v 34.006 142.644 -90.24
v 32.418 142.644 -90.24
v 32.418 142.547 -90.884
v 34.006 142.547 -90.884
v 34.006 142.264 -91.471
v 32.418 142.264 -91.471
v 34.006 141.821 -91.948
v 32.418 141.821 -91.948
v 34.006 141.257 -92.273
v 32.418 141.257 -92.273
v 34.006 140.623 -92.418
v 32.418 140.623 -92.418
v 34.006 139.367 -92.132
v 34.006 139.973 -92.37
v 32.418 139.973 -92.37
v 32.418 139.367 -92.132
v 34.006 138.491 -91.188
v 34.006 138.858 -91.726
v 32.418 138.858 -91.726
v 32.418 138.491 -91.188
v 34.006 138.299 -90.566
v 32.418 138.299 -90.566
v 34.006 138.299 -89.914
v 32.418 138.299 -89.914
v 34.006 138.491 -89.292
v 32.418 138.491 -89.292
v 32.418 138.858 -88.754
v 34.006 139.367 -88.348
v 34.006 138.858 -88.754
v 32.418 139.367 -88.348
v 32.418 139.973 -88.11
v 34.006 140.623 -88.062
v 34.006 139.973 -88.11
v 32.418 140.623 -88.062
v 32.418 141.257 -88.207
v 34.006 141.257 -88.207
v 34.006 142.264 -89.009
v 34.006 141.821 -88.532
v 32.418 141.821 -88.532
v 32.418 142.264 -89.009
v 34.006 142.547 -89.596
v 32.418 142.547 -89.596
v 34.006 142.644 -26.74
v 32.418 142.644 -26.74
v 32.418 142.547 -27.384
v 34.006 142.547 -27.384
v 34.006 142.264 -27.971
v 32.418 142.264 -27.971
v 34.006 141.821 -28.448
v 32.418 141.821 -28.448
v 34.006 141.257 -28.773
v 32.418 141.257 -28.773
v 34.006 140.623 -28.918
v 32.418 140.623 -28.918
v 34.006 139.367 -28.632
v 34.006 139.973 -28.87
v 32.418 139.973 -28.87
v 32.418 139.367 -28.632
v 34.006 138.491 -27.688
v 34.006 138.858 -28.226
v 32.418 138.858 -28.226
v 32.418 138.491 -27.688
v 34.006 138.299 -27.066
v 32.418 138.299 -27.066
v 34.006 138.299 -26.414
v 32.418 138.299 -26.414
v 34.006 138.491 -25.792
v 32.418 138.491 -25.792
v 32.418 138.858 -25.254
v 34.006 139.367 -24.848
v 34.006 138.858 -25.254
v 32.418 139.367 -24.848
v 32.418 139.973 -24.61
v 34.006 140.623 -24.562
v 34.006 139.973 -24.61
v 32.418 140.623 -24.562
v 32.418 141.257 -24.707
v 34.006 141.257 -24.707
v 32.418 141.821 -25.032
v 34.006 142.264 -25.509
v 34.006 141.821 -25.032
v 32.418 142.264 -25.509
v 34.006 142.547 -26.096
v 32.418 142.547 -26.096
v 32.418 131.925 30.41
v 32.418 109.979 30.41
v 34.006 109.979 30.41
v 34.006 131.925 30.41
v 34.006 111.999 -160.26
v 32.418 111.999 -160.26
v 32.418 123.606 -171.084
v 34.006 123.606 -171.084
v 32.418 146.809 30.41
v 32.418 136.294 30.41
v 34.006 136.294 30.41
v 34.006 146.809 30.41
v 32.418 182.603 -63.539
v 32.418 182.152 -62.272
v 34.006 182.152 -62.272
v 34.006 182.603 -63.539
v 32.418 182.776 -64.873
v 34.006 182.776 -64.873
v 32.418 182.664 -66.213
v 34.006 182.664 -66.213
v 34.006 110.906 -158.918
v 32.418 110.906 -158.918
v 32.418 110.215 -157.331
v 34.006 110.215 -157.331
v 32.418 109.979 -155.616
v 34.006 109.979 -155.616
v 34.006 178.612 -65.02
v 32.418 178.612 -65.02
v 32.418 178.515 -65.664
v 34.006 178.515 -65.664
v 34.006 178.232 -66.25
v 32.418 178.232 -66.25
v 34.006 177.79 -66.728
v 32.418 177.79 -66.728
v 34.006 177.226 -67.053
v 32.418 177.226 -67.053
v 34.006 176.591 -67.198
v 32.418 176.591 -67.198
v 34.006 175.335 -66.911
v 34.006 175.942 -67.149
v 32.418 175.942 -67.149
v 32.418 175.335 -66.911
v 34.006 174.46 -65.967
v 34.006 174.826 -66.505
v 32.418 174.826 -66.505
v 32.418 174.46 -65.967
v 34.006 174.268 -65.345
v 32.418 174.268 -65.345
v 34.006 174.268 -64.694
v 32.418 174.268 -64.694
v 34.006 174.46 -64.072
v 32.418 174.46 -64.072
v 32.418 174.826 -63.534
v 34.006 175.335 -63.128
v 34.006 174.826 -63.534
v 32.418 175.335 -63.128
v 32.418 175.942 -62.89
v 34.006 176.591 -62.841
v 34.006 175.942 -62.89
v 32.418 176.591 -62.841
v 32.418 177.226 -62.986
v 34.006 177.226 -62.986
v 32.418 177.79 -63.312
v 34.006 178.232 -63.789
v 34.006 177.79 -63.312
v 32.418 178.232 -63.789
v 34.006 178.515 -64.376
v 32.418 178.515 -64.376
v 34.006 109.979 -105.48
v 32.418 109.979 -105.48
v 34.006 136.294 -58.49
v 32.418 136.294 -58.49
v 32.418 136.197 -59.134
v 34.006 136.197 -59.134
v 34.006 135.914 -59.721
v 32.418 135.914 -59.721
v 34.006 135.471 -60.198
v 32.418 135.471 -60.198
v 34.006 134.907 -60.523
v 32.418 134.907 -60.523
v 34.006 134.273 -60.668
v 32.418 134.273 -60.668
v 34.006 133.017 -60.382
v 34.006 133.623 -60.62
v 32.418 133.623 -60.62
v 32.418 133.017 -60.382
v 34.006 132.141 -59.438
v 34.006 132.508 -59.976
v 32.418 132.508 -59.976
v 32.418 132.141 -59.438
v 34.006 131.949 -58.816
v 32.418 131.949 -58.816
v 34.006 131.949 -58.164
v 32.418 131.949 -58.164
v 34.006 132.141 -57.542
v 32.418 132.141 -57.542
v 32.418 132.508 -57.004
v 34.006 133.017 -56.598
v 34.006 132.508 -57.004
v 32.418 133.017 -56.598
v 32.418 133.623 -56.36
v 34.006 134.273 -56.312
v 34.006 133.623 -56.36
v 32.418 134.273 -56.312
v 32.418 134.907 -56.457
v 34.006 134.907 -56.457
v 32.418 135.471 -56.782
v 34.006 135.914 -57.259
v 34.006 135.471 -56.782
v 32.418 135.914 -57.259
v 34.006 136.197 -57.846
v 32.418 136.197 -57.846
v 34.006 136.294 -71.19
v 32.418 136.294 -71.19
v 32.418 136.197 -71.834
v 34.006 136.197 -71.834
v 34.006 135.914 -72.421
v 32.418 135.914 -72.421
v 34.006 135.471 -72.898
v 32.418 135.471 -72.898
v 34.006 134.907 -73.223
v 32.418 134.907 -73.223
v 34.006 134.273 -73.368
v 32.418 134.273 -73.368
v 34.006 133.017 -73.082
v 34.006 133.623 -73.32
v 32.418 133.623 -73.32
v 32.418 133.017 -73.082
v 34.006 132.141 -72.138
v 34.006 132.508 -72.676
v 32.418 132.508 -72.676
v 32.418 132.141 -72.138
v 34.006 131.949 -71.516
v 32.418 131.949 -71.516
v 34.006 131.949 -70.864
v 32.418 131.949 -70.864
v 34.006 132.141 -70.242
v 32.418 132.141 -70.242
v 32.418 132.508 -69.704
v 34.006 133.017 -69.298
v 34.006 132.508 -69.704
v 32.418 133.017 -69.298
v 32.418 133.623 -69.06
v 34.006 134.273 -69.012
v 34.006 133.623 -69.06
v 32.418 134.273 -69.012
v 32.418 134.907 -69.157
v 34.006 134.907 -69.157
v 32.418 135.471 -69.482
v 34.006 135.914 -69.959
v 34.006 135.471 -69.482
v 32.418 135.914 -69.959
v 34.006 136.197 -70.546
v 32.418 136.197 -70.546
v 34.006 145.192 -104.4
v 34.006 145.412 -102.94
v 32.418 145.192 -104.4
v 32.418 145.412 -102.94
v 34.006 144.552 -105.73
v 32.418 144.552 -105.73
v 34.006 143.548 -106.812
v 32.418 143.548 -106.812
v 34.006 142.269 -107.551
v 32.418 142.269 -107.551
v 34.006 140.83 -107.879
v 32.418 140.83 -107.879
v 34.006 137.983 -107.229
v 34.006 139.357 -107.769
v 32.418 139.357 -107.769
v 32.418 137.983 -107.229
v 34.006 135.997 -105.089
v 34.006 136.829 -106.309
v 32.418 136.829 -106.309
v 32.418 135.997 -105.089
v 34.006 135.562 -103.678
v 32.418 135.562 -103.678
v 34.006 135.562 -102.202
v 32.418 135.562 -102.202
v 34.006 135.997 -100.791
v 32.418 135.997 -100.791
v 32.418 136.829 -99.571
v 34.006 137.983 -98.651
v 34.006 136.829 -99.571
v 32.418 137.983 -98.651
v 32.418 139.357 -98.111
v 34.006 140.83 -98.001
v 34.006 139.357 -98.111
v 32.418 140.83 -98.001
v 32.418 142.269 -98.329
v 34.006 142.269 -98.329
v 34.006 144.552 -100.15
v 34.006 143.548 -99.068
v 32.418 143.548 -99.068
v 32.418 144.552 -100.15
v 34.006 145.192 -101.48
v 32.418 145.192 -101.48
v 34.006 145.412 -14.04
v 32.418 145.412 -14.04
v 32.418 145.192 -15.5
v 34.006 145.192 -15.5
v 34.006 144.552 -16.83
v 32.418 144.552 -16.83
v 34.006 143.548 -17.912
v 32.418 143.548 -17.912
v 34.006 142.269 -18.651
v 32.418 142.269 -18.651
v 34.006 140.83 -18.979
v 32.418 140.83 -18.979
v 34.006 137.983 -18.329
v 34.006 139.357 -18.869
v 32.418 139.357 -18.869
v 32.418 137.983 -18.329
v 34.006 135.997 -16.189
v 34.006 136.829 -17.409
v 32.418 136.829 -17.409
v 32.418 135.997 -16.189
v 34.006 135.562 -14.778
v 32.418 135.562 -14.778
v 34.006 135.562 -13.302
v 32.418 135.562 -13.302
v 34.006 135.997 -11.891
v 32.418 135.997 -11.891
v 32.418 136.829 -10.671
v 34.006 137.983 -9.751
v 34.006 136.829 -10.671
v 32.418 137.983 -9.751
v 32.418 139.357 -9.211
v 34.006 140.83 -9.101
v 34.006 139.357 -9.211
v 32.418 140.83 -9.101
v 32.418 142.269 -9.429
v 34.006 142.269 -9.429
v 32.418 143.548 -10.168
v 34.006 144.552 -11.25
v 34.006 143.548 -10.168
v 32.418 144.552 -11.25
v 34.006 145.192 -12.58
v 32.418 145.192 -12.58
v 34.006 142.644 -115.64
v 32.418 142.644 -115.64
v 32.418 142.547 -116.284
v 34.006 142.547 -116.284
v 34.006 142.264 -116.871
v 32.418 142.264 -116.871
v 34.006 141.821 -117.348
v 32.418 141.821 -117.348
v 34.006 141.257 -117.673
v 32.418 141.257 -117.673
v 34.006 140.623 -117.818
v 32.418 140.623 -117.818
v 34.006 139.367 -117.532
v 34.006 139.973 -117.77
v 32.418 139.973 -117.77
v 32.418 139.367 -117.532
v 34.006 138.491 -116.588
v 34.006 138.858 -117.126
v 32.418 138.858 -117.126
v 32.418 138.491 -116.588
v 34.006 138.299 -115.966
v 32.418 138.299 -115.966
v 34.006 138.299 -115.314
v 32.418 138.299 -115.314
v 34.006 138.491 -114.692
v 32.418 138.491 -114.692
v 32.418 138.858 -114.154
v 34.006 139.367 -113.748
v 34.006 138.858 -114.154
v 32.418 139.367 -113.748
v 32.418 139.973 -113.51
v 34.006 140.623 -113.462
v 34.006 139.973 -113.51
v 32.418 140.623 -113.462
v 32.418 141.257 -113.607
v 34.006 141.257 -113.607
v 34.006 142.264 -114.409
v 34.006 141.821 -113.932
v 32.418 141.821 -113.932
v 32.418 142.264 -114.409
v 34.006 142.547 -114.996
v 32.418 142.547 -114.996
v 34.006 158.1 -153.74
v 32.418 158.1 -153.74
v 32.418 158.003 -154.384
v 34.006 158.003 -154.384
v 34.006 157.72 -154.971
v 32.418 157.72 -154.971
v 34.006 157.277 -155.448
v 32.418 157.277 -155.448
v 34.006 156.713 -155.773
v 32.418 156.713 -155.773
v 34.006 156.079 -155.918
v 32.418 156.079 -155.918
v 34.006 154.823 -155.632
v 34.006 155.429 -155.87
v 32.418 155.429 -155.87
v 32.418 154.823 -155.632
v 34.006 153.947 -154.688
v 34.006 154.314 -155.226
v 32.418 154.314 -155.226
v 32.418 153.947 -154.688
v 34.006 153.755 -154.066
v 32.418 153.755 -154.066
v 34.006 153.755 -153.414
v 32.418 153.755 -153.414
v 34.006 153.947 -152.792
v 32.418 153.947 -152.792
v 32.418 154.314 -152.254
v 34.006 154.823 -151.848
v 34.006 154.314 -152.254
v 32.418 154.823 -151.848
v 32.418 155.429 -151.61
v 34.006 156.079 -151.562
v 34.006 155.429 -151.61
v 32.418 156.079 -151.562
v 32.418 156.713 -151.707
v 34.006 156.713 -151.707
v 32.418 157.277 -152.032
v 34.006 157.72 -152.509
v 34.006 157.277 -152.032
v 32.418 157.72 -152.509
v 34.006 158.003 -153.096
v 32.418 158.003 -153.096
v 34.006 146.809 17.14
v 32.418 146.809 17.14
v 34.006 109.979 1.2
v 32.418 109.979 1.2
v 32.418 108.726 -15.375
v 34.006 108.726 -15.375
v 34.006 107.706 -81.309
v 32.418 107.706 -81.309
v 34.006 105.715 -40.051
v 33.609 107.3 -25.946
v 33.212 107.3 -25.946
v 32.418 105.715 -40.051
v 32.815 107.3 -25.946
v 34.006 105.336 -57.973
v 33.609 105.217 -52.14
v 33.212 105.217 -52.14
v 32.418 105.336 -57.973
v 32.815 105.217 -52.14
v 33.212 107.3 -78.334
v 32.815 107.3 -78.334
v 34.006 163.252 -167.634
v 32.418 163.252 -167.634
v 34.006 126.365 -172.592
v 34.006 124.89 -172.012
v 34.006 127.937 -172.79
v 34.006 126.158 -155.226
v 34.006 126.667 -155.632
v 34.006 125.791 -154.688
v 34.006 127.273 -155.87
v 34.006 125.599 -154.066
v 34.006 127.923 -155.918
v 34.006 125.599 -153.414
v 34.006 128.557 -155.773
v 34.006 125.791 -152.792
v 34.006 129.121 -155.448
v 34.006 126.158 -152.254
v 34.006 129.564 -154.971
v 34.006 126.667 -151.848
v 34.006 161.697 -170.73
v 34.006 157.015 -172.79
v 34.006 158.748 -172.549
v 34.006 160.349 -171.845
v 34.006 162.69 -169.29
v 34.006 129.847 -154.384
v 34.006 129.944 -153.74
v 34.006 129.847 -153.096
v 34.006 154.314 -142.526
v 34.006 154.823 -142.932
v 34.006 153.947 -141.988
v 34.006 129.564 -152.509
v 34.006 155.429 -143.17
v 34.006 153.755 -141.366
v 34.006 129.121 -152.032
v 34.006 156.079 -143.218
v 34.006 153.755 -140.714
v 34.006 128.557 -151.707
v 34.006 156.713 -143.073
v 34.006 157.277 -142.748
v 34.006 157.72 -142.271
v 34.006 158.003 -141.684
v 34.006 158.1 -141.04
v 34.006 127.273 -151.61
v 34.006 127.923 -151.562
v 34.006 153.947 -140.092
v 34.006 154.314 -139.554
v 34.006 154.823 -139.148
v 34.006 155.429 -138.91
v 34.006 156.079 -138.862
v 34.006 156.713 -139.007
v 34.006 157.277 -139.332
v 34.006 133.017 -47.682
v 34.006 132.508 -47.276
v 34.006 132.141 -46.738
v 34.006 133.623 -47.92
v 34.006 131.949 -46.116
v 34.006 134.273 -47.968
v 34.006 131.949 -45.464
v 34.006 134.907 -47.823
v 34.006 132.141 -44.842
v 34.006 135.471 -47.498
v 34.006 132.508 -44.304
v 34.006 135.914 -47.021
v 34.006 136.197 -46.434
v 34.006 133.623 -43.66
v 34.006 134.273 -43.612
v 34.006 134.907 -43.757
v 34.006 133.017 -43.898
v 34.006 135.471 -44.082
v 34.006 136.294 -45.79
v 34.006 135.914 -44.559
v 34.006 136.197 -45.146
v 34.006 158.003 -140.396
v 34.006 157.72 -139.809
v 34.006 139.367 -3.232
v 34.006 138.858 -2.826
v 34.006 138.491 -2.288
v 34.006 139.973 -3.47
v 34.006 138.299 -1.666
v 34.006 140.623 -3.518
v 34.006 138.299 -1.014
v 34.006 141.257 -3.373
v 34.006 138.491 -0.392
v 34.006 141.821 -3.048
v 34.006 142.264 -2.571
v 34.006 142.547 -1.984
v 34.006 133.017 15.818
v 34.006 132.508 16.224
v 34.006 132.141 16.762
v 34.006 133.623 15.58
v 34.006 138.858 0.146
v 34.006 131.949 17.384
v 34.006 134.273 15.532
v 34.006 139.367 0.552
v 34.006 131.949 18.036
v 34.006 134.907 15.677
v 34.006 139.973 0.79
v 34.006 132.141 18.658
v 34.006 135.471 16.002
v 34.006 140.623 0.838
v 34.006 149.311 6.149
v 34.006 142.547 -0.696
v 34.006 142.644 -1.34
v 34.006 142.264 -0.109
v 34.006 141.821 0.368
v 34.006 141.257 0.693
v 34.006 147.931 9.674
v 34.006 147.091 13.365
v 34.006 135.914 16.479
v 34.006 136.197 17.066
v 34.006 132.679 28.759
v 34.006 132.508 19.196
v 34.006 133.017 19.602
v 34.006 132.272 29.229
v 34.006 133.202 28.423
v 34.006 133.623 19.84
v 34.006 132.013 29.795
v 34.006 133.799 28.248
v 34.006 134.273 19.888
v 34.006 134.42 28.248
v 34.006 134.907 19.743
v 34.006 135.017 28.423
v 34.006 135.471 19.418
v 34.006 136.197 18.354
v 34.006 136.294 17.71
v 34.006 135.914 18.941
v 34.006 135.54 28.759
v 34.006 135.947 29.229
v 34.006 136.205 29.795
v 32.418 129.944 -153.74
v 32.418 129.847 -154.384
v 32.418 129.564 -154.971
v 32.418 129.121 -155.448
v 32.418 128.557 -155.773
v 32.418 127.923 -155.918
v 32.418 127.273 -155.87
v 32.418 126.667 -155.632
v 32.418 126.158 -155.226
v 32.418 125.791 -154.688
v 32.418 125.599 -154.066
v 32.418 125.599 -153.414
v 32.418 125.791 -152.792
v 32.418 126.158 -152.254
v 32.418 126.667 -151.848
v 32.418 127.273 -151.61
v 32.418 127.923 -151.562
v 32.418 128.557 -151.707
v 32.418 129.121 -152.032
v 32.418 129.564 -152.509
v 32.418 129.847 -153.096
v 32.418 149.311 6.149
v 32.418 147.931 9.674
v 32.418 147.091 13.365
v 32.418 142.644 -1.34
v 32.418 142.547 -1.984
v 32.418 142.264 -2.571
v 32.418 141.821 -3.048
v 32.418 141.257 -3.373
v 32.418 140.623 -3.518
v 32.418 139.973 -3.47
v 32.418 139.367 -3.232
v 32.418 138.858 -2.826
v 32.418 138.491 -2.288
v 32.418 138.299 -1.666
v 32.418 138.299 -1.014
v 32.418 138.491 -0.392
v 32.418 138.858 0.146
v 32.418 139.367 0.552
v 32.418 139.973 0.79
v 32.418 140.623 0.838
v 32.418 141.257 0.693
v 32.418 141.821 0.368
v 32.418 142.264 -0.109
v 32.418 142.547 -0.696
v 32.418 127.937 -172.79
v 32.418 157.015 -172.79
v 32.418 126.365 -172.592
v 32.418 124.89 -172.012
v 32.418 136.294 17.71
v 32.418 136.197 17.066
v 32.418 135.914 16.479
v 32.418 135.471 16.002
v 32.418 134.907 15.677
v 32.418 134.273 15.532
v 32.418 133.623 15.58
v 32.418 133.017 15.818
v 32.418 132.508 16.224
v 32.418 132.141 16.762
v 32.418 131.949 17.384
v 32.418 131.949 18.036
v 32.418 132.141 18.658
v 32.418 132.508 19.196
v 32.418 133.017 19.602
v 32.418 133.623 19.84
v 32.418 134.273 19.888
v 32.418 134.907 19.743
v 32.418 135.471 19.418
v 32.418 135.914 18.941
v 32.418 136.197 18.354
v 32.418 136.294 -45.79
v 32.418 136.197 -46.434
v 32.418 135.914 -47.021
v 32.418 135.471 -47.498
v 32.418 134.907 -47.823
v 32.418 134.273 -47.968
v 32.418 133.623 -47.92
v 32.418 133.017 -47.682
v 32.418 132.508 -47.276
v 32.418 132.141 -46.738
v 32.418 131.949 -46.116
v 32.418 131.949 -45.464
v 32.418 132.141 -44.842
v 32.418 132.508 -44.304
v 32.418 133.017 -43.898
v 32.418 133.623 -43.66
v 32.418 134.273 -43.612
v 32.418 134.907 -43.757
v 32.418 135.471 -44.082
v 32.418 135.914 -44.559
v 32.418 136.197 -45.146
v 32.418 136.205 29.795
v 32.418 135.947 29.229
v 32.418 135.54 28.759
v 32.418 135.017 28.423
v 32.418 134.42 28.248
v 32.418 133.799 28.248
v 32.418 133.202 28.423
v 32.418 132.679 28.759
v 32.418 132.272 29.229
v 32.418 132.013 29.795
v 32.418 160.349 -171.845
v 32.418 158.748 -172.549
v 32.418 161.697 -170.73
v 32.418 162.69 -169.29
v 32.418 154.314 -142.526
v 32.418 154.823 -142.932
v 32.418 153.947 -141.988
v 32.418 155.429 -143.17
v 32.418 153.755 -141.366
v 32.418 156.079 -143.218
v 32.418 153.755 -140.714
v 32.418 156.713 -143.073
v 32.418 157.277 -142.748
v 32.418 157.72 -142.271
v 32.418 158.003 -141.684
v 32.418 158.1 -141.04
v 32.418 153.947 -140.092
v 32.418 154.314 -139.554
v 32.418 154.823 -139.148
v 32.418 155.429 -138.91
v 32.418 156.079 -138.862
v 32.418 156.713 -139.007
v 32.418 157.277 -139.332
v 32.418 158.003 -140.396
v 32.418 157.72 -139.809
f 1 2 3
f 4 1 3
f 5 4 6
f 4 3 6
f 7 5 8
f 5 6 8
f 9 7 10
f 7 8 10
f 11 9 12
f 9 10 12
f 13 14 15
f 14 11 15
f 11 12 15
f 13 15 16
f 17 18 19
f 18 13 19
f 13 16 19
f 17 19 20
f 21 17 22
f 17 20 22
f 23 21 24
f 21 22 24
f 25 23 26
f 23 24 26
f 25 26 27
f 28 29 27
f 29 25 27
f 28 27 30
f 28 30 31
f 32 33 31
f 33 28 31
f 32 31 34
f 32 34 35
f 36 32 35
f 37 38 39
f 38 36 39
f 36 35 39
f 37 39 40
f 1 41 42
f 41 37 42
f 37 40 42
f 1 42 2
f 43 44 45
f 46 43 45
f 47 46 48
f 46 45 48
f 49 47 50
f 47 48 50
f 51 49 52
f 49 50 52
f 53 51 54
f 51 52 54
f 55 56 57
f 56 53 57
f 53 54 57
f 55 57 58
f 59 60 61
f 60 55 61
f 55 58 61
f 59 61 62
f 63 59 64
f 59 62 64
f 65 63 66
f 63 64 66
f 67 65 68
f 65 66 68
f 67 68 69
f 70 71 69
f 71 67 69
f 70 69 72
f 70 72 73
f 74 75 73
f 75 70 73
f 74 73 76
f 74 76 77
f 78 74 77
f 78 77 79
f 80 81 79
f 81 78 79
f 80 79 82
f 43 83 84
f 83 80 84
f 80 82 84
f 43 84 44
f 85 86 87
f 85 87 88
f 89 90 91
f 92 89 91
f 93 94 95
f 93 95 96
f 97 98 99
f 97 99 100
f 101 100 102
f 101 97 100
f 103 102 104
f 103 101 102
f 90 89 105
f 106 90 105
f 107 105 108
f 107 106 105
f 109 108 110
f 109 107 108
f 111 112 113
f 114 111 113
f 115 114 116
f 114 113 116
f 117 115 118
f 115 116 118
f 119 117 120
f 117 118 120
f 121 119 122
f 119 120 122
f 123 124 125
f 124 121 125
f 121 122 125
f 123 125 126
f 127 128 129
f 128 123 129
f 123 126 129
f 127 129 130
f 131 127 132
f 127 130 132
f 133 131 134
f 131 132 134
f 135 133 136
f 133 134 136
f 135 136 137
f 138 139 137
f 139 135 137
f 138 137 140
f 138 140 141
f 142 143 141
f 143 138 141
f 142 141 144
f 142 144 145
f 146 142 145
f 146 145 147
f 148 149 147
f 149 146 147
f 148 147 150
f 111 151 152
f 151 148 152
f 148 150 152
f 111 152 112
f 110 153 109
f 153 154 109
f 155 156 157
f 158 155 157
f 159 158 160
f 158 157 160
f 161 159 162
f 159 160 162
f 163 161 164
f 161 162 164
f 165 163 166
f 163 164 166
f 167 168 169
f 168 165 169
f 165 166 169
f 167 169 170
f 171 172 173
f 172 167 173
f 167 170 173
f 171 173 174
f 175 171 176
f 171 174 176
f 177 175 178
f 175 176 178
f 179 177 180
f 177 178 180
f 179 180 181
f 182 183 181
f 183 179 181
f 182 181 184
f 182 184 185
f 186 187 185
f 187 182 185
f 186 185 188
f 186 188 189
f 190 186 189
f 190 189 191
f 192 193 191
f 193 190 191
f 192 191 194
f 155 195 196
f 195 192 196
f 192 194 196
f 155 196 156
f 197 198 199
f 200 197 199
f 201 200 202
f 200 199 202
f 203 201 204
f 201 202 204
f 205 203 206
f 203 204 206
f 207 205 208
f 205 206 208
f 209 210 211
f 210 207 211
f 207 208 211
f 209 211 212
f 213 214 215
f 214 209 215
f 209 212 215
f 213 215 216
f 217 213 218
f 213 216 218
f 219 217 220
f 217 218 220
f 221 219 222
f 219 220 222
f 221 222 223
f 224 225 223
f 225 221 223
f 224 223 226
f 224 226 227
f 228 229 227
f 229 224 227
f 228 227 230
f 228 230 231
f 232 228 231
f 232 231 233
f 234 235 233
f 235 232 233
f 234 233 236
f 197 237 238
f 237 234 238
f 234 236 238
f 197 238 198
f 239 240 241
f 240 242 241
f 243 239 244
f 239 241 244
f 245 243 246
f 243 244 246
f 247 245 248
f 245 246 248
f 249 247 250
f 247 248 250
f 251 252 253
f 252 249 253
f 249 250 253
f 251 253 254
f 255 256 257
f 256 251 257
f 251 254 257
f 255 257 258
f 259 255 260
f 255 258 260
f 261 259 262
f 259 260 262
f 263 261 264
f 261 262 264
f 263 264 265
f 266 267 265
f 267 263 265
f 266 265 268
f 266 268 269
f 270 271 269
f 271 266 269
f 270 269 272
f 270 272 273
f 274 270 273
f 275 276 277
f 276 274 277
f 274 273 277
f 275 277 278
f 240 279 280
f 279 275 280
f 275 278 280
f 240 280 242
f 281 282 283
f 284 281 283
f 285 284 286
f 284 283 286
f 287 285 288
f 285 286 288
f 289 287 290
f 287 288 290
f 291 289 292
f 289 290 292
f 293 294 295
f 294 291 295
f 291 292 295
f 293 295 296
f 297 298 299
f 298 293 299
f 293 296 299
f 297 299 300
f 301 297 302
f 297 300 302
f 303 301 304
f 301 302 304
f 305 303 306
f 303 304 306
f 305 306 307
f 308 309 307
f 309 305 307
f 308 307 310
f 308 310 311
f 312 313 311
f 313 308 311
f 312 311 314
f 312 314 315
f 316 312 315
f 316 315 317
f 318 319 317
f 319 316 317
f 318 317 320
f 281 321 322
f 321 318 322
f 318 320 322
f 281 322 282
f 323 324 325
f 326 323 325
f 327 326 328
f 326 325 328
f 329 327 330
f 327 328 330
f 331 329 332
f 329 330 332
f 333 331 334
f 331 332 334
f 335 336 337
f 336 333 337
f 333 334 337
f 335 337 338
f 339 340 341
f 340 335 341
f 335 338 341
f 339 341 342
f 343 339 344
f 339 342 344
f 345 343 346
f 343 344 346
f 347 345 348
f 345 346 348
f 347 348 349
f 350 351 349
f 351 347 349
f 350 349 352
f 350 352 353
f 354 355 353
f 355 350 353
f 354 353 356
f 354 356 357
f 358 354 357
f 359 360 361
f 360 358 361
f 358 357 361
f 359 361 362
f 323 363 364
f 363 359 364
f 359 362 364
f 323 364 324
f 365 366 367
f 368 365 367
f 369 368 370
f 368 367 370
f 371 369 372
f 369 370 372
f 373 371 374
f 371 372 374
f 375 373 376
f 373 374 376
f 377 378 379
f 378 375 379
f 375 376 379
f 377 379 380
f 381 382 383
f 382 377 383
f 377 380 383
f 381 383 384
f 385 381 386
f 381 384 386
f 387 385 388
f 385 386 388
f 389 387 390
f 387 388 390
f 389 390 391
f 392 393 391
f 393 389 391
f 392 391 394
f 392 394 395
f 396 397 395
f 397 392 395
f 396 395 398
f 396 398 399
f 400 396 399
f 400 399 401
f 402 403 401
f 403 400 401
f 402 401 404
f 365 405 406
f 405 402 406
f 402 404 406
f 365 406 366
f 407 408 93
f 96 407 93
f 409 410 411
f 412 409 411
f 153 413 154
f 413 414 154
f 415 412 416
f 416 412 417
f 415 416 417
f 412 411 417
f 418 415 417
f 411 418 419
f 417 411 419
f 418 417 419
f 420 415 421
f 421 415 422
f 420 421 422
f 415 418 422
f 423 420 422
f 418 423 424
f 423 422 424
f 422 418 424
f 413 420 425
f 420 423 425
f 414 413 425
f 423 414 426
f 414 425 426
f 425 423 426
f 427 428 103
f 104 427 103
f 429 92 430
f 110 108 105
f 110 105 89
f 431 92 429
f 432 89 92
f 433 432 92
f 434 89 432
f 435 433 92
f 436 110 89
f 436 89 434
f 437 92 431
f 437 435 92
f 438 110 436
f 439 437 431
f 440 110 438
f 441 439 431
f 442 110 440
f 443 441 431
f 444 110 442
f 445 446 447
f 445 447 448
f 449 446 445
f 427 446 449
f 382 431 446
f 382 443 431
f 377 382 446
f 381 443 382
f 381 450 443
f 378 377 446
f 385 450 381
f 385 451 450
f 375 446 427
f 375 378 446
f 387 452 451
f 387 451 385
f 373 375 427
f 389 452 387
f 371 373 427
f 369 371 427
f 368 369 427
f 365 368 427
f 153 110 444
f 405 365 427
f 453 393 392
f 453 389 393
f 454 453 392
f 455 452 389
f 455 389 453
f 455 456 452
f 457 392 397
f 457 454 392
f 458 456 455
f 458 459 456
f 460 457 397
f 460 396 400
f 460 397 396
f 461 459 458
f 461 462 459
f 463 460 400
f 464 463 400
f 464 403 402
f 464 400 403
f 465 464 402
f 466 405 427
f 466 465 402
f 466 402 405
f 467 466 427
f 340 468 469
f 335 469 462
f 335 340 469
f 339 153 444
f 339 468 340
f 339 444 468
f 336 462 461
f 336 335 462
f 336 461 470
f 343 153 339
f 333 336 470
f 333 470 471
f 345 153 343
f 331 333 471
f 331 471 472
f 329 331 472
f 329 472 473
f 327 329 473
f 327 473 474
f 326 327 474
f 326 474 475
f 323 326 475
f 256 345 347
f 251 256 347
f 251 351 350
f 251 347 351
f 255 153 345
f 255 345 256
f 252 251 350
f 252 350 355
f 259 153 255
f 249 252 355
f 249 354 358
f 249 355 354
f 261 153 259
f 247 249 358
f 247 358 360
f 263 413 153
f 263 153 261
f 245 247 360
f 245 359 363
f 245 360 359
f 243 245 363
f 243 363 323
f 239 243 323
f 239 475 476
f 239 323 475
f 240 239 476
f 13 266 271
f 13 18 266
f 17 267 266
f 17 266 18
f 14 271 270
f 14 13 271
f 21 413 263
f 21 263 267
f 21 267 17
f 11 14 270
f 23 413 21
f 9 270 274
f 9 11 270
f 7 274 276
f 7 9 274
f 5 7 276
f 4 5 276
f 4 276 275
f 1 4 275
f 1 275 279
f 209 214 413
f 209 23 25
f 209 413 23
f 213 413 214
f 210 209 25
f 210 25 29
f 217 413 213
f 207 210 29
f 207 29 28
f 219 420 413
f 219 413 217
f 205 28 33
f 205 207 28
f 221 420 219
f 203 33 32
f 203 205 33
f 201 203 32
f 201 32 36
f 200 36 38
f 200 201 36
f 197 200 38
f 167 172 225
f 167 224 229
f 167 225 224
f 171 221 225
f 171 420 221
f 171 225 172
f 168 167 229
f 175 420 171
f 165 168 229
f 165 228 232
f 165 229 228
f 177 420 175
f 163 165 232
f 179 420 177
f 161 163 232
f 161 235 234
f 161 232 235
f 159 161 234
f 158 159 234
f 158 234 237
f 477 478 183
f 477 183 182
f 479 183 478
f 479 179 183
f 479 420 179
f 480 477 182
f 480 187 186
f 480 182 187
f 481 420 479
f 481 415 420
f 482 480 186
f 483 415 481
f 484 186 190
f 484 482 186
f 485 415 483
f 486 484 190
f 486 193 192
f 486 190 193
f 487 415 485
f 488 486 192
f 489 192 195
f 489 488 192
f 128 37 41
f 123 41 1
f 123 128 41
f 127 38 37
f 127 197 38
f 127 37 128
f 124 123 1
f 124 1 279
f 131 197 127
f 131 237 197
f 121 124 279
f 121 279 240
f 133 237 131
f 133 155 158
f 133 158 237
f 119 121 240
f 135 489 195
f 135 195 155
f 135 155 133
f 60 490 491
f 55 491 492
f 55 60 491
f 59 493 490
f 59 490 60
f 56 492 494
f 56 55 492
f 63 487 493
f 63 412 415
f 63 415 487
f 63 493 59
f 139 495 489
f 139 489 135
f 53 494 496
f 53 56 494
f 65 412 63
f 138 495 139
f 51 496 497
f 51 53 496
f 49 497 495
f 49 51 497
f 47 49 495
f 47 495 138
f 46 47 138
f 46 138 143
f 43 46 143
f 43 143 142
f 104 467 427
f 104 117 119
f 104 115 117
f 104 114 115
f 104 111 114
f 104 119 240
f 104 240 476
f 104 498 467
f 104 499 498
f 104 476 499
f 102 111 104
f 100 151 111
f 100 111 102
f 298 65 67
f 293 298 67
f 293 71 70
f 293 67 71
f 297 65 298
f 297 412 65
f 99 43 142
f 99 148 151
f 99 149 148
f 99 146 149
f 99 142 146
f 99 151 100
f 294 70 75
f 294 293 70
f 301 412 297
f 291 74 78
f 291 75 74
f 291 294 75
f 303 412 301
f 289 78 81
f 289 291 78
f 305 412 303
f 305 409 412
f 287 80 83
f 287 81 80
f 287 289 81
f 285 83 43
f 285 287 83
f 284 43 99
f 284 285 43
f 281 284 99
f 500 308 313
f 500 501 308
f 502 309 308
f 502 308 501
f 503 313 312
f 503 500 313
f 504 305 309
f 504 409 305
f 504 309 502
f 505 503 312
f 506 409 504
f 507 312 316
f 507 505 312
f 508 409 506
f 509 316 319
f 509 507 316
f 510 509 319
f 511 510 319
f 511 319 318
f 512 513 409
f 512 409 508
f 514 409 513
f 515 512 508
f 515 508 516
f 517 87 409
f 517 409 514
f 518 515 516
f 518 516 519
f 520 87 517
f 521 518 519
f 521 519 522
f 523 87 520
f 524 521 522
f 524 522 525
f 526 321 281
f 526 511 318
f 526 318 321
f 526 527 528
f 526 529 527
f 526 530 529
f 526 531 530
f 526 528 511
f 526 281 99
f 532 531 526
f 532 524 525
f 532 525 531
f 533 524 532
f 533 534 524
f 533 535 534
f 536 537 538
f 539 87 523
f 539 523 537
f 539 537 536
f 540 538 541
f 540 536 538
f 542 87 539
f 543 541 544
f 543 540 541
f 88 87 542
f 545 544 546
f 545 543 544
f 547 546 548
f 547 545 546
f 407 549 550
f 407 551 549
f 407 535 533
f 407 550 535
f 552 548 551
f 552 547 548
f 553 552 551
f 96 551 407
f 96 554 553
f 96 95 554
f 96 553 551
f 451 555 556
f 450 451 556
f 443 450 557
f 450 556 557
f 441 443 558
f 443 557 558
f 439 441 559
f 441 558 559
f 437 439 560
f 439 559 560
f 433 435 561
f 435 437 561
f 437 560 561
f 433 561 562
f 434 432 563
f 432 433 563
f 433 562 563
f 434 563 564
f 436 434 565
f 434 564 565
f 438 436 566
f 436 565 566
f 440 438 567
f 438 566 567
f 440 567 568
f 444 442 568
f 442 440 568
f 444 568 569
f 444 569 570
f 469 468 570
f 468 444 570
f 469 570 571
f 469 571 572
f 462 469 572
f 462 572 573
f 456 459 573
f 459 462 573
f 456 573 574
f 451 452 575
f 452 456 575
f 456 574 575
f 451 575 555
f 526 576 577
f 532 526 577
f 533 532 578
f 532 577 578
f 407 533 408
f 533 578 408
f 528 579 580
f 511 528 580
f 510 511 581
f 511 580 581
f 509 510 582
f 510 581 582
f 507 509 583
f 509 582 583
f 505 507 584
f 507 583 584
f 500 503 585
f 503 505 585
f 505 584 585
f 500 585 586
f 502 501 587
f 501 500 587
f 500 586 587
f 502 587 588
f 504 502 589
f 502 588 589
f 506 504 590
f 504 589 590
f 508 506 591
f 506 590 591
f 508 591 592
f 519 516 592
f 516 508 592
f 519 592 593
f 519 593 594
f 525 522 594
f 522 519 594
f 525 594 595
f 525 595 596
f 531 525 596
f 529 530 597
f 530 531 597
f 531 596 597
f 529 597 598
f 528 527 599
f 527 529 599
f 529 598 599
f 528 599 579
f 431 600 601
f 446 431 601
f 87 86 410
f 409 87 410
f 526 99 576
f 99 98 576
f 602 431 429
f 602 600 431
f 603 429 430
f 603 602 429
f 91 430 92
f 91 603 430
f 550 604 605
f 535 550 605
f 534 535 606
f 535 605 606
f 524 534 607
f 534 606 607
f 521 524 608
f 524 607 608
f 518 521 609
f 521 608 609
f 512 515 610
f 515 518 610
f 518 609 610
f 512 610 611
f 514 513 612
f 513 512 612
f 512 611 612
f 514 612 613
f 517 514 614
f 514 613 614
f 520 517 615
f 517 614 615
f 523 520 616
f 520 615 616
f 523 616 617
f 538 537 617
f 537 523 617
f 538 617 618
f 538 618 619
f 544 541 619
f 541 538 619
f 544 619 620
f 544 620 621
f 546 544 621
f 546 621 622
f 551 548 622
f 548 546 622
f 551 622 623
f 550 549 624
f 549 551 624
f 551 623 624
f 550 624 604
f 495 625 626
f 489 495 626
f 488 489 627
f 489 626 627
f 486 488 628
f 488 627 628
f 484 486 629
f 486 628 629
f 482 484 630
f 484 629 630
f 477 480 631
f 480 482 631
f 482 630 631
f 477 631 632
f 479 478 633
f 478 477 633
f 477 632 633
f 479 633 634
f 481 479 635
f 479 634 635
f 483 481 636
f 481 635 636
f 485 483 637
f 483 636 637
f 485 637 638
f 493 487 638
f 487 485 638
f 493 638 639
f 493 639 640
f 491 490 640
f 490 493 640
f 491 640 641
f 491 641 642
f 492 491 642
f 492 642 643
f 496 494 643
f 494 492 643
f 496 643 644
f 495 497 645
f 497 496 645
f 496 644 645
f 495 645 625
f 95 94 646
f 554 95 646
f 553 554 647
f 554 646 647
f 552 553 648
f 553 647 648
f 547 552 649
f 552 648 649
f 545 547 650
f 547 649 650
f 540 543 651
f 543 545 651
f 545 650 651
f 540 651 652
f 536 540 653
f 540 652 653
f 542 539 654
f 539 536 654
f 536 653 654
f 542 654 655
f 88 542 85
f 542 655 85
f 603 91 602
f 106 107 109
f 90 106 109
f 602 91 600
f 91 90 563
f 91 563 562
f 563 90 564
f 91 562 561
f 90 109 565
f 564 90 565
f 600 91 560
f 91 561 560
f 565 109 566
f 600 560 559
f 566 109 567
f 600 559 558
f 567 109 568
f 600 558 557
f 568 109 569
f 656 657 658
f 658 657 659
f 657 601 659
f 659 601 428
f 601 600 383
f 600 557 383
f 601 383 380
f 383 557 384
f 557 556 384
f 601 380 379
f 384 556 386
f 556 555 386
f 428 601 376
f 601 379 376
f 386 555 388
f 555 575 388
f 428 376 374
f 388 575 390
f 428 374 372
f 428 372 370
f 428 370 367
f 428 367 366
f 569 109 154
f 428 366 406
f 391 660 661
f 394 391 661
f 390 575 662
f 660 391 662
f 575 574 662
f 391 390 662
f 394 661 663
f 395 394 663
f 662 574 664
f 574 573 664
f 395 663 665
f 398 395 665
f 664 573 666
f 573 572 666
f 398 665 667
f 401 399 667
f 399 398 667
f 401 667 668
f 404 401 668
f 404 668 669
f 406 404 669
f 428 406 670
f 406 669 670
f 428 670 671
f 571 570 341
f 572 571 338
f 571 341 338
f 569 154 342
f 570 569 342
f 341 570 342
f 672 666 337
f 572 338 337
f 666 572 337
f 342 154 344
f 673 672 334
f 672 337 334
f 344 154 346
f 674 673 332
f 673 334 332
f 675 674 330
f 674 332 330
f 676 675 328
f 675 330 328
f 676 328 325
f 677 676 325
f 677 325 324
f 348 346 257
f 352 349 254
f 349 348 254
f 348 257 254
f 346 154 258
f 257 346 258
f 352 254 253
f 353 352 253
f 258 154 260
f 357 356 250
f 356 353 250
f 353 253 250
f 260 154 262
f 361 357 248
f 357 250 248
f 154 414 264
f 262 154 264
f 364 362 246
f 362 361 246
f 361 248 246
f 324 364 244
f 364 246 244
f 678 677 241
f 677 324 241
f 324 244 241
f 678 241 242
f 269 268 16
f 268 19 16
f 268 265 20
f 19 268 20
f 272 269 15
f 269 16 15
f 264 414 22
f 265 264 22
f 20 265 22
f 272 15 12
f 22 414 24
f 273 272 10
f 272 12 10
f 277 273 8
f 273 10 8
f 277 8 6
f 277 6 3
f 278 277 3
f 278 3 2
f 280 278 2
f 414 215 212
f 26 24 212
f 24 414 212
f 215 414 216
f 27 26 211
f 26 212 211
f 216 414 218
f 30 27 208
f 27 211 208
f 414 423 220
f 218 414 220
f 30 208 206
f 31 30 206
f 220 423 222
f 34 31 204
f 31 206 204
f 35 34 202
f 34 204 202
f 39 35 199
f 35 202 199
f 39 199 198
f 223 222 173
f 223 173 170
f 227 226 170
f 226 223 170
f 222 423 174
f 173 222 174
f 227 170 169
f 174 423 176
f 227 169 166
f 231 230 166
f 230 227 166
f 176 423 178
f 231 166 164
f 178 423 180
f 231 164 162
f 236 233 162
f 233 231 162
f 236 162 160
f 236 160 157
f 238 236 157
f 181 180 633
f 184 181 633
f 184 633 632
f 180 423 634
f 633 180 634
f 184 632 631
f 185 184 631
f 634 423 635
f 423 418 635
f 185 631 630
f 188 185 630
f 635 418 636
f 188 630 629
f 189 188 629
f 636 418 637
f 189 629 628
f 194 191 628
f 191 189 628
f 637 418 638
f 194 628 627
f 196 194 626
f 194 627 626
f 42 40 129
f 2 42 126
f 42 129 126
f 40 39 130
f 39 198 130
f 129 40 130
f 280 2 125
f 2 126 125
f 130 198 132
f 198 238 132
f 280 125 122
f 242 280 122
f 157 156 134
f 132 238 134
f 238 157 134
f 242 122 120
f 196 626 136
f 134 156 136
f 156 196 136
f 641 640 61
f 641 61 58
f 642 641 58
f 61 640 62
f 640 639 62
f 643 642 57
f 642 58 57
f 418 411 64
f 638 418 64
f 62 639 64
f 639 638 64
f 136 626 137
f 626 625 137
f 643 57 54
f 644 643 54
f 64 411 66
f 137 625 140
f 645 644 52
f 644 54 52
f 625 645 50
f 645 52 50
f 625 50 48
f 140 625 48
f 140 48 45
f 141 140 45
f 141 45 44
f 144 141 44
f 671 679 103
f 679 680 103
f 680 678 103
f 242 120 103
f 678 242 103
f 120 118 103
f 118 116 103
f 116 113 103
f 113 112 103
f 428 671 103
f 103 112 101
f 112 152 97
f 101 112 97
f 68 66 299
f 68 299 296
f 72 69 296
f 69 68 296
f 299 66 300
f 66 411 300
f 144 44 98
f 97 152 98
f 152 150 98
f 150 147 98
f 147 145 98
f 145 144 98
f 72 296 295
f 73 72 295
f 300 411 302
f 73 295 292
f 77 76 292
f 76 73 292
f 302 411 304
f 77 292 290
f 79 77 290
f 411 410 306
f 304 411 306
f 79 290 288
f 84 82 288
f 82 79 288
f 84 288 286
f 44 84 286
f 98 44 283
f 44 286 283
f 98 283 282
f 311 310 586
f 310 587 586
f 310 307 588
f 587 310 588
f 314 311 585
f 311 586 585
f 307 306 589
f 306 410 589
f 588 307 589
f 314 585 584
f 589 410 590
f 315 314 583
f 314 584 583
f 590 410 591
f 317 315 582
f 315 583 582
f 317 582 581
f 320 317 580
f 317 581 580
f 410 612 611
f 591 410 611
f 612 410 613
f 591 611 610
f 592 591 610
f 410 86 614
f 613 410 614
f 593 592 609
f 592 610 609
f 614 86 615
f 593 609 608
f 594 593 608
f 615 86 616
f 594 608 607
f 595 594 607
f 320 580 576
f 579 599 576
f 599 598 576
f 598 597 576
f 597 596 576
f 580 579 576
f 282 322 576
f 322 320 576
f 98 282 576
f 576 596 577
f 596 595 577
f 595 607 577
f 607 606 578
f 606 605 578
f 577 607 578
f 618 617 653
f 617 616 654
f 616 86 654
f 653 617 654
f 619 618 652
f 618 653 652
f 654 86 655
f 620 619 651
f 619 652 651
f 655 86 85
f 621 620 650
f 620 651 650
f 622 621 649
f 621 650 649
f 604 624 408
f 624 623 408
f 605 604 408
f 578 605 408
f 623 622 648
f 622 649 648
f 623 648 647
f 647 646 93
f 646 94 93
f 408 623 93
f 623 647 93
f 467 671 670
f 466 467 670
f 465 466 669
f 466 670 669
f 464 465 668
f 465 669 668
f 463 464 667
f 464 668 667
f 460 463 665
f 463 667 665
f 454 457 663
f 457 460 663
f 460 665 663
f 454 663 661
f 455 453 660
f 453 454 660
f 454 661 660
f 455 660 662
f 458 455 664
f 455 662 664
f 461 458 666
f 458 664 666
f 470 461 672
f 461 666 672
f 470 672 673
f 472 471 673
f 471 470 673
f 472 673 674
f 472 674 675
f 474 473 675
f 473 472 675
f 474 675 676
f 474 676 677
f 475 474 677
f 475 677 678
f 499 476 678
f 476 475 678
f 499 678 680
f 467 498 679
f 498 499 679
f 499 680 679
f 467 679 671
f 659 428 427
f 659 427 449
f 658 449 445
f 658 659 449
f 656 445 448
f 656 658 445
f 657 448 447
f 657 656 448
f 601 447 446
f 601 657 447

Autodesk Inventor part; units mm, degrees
ref_plane "YZ Plane" through (0, 0, 0) normal (1, 0, 0) x (0, 1, 0)
ref_plane "XZ Plane" through (0, 0, 0) normal (0, 1, 0) x (-1, 0, 0)
ref_plane "XY Plane" through (0, 0, 0) normal (0, 0, 1) x (1, 0, 0)
ref_plane "Work Plane1" through (32.4184, 134.1094, 24.06) normal (1, 0, 0) x (0, 1, 0)
sketch "Sketch1" plane through (32.4184, 134.1094, 24.06) normal (1, 0, 0) x (0, 1, 0)
  line L0 (-24.13, 172.2574) -> (-24.13, 6.35) projected
  line L1 (-24.13, 6.35) -> (-2.1844, 6.35) projected
  line L2 (-10.3187, -184.15) -> (-2.3114, -184.15) projected
  circle A0 centre (6.35, -127) radius 2.1844 projected
  circle A1 centre (6.35, -38.1) radius 2.1844 projected
  circle A2 centre (0, -82.55) radius 2.1844 projected
  circle A3 centre (0, 6.35) radius 2.1844 projected
  circle A4 centre (0, -6.35) radius 2.1844 projected
  circle A5 centre (42.3182, -89.0797) radius 2.1844 projected
  line L3 (-24.13, 6.35) -> (-24.13, -179.6761)
  line L4 (-22.1107, -184.3202) -> (-10.5035, -195.1441)
  line L5 (-6.1728, -196.85) -> (22.906, -196.85)
  line L6 (29.1428, -191.6937) -> (48.555, -90.2734)
  line L7 (-24.13, 6.35) -> (12.7, 6.35)
  line L8 (12.7, -7.2898) -> (12.7, -68.7578) projected
  circle A6 centre (42.3182, -89.0797) radius 6.35
  line L9 (48.0429, -86.3318) -> (15.2013, -17.911)
  line L10 (12.7, -6.9198) -> (12.7, 6.35)
  circle A7 centre (21.8059, -177.8) radius 2.1844 projected
  circle A8 centre (21.8059, -165.1) radius 2.1844 projected
  arc A9 (12.7, -6.9198) -> (15.2013, -17.911) centre (38.1, -6.9198) ccw
  arc A10 (22.906, -196.85) -> (29.1428, -191.6937) centre (22.906, -190.5) ccw
  arc A11 (-10.5035, -195.1441) -> (-6.1728, -196.85) centre (-6.1728, -190.5) ccw
  arc A12 (-24.13, -179.6761) -> (-22.1107, -184.3202) centre (-17.78, -179.6761) ccw
  circle A13 centre (-6.35, -76.2) radius 2.1844 construction
  line L11 (-24.13, -22.86) -> (-24.13, -50.8) construction
  line L12 (-24.13, -50.8) -> (-36.83, -76.2) construction
  line L13 (-36.83, -76.2) -> (-24.13, -101.6) construction
  line L14 (-24.13, -101.6) -> (-24.13, -129.54) construction
  spline S0 degree 4 poles (-24.13, -22.86) (-24.13, -50.8) (-36.83, -76.2) (-24.13, -101.6) (-24.13, -129.54) knots 1 1 1 1 1 2 2 2 2 2
  circle A14 centre (6.35, -127) radius 4.953
  circle A15 centre (6.35, -38.1) radius 4.953
  circle A16 centre (0, -95.25) radius 2.1844
  circle A17 centre (6.35, -25.4) radius 2.1844 projected
  circle A18 centre (6.35, -50.8) radius 2.1844 projected
  circle A19 centre (0, -95.25) radius 2.1844 projected
  circle A20 centre (0, -69.85) radius 2.1844
  circle A21 centre (0, -82.55) radius 2.1844
  circle A22 centre (6.35, -114.3) radius 2.1844 projected
  circle A23 centre (6.35, -139.7) radius 2.1844 projected
  circle A24 centre (6.35, -127) radius 2.1844 projected
  circle A25 centre (-6.35, -177.8) radius 2.1844 projected
  point P0 (-134.1094, -24.06)
  point P1 (0, -82.55)
  point P2 (-8.6741, -196.85)
  point P3 (28.1559, -196.85)
  point P4 (12.7, -12.7)
  point P5 (-6.3151, -184.15)
  point P6 (2.1844, 6.35)
  point P7 (-24.13, -22.86)
  point P8 (-24.13, -129.54)
  dimension "d0" = 12.7
  dimension "d1" = 12.7
  dimension "d2" = 133
  dimension "d3" = 6.35
  dimension "d4" = 36.83
  dimension "d5" = 19.05
  dimension "d6" = 25.4
  dimension "d7" = 6.35
  dimension "d8" = 27.94
  dimension "d9" = 27.94
  dimension "d10" = 25.4
  dimension "d11" = 25.4
  dimension "d12" = 12.7
  dimension "d13" = 9.906
  dimension "d14" = 9.906
  dimension "d18" = 4.3688
extrude "Extrusion1" add sketch "Sketch1" along normal blind 1.5875 contours L1 A3 L7 L10 A9 L9 A6 L6 A10 L5 A11 L4 A12 L3 | L3 S0 | A6
